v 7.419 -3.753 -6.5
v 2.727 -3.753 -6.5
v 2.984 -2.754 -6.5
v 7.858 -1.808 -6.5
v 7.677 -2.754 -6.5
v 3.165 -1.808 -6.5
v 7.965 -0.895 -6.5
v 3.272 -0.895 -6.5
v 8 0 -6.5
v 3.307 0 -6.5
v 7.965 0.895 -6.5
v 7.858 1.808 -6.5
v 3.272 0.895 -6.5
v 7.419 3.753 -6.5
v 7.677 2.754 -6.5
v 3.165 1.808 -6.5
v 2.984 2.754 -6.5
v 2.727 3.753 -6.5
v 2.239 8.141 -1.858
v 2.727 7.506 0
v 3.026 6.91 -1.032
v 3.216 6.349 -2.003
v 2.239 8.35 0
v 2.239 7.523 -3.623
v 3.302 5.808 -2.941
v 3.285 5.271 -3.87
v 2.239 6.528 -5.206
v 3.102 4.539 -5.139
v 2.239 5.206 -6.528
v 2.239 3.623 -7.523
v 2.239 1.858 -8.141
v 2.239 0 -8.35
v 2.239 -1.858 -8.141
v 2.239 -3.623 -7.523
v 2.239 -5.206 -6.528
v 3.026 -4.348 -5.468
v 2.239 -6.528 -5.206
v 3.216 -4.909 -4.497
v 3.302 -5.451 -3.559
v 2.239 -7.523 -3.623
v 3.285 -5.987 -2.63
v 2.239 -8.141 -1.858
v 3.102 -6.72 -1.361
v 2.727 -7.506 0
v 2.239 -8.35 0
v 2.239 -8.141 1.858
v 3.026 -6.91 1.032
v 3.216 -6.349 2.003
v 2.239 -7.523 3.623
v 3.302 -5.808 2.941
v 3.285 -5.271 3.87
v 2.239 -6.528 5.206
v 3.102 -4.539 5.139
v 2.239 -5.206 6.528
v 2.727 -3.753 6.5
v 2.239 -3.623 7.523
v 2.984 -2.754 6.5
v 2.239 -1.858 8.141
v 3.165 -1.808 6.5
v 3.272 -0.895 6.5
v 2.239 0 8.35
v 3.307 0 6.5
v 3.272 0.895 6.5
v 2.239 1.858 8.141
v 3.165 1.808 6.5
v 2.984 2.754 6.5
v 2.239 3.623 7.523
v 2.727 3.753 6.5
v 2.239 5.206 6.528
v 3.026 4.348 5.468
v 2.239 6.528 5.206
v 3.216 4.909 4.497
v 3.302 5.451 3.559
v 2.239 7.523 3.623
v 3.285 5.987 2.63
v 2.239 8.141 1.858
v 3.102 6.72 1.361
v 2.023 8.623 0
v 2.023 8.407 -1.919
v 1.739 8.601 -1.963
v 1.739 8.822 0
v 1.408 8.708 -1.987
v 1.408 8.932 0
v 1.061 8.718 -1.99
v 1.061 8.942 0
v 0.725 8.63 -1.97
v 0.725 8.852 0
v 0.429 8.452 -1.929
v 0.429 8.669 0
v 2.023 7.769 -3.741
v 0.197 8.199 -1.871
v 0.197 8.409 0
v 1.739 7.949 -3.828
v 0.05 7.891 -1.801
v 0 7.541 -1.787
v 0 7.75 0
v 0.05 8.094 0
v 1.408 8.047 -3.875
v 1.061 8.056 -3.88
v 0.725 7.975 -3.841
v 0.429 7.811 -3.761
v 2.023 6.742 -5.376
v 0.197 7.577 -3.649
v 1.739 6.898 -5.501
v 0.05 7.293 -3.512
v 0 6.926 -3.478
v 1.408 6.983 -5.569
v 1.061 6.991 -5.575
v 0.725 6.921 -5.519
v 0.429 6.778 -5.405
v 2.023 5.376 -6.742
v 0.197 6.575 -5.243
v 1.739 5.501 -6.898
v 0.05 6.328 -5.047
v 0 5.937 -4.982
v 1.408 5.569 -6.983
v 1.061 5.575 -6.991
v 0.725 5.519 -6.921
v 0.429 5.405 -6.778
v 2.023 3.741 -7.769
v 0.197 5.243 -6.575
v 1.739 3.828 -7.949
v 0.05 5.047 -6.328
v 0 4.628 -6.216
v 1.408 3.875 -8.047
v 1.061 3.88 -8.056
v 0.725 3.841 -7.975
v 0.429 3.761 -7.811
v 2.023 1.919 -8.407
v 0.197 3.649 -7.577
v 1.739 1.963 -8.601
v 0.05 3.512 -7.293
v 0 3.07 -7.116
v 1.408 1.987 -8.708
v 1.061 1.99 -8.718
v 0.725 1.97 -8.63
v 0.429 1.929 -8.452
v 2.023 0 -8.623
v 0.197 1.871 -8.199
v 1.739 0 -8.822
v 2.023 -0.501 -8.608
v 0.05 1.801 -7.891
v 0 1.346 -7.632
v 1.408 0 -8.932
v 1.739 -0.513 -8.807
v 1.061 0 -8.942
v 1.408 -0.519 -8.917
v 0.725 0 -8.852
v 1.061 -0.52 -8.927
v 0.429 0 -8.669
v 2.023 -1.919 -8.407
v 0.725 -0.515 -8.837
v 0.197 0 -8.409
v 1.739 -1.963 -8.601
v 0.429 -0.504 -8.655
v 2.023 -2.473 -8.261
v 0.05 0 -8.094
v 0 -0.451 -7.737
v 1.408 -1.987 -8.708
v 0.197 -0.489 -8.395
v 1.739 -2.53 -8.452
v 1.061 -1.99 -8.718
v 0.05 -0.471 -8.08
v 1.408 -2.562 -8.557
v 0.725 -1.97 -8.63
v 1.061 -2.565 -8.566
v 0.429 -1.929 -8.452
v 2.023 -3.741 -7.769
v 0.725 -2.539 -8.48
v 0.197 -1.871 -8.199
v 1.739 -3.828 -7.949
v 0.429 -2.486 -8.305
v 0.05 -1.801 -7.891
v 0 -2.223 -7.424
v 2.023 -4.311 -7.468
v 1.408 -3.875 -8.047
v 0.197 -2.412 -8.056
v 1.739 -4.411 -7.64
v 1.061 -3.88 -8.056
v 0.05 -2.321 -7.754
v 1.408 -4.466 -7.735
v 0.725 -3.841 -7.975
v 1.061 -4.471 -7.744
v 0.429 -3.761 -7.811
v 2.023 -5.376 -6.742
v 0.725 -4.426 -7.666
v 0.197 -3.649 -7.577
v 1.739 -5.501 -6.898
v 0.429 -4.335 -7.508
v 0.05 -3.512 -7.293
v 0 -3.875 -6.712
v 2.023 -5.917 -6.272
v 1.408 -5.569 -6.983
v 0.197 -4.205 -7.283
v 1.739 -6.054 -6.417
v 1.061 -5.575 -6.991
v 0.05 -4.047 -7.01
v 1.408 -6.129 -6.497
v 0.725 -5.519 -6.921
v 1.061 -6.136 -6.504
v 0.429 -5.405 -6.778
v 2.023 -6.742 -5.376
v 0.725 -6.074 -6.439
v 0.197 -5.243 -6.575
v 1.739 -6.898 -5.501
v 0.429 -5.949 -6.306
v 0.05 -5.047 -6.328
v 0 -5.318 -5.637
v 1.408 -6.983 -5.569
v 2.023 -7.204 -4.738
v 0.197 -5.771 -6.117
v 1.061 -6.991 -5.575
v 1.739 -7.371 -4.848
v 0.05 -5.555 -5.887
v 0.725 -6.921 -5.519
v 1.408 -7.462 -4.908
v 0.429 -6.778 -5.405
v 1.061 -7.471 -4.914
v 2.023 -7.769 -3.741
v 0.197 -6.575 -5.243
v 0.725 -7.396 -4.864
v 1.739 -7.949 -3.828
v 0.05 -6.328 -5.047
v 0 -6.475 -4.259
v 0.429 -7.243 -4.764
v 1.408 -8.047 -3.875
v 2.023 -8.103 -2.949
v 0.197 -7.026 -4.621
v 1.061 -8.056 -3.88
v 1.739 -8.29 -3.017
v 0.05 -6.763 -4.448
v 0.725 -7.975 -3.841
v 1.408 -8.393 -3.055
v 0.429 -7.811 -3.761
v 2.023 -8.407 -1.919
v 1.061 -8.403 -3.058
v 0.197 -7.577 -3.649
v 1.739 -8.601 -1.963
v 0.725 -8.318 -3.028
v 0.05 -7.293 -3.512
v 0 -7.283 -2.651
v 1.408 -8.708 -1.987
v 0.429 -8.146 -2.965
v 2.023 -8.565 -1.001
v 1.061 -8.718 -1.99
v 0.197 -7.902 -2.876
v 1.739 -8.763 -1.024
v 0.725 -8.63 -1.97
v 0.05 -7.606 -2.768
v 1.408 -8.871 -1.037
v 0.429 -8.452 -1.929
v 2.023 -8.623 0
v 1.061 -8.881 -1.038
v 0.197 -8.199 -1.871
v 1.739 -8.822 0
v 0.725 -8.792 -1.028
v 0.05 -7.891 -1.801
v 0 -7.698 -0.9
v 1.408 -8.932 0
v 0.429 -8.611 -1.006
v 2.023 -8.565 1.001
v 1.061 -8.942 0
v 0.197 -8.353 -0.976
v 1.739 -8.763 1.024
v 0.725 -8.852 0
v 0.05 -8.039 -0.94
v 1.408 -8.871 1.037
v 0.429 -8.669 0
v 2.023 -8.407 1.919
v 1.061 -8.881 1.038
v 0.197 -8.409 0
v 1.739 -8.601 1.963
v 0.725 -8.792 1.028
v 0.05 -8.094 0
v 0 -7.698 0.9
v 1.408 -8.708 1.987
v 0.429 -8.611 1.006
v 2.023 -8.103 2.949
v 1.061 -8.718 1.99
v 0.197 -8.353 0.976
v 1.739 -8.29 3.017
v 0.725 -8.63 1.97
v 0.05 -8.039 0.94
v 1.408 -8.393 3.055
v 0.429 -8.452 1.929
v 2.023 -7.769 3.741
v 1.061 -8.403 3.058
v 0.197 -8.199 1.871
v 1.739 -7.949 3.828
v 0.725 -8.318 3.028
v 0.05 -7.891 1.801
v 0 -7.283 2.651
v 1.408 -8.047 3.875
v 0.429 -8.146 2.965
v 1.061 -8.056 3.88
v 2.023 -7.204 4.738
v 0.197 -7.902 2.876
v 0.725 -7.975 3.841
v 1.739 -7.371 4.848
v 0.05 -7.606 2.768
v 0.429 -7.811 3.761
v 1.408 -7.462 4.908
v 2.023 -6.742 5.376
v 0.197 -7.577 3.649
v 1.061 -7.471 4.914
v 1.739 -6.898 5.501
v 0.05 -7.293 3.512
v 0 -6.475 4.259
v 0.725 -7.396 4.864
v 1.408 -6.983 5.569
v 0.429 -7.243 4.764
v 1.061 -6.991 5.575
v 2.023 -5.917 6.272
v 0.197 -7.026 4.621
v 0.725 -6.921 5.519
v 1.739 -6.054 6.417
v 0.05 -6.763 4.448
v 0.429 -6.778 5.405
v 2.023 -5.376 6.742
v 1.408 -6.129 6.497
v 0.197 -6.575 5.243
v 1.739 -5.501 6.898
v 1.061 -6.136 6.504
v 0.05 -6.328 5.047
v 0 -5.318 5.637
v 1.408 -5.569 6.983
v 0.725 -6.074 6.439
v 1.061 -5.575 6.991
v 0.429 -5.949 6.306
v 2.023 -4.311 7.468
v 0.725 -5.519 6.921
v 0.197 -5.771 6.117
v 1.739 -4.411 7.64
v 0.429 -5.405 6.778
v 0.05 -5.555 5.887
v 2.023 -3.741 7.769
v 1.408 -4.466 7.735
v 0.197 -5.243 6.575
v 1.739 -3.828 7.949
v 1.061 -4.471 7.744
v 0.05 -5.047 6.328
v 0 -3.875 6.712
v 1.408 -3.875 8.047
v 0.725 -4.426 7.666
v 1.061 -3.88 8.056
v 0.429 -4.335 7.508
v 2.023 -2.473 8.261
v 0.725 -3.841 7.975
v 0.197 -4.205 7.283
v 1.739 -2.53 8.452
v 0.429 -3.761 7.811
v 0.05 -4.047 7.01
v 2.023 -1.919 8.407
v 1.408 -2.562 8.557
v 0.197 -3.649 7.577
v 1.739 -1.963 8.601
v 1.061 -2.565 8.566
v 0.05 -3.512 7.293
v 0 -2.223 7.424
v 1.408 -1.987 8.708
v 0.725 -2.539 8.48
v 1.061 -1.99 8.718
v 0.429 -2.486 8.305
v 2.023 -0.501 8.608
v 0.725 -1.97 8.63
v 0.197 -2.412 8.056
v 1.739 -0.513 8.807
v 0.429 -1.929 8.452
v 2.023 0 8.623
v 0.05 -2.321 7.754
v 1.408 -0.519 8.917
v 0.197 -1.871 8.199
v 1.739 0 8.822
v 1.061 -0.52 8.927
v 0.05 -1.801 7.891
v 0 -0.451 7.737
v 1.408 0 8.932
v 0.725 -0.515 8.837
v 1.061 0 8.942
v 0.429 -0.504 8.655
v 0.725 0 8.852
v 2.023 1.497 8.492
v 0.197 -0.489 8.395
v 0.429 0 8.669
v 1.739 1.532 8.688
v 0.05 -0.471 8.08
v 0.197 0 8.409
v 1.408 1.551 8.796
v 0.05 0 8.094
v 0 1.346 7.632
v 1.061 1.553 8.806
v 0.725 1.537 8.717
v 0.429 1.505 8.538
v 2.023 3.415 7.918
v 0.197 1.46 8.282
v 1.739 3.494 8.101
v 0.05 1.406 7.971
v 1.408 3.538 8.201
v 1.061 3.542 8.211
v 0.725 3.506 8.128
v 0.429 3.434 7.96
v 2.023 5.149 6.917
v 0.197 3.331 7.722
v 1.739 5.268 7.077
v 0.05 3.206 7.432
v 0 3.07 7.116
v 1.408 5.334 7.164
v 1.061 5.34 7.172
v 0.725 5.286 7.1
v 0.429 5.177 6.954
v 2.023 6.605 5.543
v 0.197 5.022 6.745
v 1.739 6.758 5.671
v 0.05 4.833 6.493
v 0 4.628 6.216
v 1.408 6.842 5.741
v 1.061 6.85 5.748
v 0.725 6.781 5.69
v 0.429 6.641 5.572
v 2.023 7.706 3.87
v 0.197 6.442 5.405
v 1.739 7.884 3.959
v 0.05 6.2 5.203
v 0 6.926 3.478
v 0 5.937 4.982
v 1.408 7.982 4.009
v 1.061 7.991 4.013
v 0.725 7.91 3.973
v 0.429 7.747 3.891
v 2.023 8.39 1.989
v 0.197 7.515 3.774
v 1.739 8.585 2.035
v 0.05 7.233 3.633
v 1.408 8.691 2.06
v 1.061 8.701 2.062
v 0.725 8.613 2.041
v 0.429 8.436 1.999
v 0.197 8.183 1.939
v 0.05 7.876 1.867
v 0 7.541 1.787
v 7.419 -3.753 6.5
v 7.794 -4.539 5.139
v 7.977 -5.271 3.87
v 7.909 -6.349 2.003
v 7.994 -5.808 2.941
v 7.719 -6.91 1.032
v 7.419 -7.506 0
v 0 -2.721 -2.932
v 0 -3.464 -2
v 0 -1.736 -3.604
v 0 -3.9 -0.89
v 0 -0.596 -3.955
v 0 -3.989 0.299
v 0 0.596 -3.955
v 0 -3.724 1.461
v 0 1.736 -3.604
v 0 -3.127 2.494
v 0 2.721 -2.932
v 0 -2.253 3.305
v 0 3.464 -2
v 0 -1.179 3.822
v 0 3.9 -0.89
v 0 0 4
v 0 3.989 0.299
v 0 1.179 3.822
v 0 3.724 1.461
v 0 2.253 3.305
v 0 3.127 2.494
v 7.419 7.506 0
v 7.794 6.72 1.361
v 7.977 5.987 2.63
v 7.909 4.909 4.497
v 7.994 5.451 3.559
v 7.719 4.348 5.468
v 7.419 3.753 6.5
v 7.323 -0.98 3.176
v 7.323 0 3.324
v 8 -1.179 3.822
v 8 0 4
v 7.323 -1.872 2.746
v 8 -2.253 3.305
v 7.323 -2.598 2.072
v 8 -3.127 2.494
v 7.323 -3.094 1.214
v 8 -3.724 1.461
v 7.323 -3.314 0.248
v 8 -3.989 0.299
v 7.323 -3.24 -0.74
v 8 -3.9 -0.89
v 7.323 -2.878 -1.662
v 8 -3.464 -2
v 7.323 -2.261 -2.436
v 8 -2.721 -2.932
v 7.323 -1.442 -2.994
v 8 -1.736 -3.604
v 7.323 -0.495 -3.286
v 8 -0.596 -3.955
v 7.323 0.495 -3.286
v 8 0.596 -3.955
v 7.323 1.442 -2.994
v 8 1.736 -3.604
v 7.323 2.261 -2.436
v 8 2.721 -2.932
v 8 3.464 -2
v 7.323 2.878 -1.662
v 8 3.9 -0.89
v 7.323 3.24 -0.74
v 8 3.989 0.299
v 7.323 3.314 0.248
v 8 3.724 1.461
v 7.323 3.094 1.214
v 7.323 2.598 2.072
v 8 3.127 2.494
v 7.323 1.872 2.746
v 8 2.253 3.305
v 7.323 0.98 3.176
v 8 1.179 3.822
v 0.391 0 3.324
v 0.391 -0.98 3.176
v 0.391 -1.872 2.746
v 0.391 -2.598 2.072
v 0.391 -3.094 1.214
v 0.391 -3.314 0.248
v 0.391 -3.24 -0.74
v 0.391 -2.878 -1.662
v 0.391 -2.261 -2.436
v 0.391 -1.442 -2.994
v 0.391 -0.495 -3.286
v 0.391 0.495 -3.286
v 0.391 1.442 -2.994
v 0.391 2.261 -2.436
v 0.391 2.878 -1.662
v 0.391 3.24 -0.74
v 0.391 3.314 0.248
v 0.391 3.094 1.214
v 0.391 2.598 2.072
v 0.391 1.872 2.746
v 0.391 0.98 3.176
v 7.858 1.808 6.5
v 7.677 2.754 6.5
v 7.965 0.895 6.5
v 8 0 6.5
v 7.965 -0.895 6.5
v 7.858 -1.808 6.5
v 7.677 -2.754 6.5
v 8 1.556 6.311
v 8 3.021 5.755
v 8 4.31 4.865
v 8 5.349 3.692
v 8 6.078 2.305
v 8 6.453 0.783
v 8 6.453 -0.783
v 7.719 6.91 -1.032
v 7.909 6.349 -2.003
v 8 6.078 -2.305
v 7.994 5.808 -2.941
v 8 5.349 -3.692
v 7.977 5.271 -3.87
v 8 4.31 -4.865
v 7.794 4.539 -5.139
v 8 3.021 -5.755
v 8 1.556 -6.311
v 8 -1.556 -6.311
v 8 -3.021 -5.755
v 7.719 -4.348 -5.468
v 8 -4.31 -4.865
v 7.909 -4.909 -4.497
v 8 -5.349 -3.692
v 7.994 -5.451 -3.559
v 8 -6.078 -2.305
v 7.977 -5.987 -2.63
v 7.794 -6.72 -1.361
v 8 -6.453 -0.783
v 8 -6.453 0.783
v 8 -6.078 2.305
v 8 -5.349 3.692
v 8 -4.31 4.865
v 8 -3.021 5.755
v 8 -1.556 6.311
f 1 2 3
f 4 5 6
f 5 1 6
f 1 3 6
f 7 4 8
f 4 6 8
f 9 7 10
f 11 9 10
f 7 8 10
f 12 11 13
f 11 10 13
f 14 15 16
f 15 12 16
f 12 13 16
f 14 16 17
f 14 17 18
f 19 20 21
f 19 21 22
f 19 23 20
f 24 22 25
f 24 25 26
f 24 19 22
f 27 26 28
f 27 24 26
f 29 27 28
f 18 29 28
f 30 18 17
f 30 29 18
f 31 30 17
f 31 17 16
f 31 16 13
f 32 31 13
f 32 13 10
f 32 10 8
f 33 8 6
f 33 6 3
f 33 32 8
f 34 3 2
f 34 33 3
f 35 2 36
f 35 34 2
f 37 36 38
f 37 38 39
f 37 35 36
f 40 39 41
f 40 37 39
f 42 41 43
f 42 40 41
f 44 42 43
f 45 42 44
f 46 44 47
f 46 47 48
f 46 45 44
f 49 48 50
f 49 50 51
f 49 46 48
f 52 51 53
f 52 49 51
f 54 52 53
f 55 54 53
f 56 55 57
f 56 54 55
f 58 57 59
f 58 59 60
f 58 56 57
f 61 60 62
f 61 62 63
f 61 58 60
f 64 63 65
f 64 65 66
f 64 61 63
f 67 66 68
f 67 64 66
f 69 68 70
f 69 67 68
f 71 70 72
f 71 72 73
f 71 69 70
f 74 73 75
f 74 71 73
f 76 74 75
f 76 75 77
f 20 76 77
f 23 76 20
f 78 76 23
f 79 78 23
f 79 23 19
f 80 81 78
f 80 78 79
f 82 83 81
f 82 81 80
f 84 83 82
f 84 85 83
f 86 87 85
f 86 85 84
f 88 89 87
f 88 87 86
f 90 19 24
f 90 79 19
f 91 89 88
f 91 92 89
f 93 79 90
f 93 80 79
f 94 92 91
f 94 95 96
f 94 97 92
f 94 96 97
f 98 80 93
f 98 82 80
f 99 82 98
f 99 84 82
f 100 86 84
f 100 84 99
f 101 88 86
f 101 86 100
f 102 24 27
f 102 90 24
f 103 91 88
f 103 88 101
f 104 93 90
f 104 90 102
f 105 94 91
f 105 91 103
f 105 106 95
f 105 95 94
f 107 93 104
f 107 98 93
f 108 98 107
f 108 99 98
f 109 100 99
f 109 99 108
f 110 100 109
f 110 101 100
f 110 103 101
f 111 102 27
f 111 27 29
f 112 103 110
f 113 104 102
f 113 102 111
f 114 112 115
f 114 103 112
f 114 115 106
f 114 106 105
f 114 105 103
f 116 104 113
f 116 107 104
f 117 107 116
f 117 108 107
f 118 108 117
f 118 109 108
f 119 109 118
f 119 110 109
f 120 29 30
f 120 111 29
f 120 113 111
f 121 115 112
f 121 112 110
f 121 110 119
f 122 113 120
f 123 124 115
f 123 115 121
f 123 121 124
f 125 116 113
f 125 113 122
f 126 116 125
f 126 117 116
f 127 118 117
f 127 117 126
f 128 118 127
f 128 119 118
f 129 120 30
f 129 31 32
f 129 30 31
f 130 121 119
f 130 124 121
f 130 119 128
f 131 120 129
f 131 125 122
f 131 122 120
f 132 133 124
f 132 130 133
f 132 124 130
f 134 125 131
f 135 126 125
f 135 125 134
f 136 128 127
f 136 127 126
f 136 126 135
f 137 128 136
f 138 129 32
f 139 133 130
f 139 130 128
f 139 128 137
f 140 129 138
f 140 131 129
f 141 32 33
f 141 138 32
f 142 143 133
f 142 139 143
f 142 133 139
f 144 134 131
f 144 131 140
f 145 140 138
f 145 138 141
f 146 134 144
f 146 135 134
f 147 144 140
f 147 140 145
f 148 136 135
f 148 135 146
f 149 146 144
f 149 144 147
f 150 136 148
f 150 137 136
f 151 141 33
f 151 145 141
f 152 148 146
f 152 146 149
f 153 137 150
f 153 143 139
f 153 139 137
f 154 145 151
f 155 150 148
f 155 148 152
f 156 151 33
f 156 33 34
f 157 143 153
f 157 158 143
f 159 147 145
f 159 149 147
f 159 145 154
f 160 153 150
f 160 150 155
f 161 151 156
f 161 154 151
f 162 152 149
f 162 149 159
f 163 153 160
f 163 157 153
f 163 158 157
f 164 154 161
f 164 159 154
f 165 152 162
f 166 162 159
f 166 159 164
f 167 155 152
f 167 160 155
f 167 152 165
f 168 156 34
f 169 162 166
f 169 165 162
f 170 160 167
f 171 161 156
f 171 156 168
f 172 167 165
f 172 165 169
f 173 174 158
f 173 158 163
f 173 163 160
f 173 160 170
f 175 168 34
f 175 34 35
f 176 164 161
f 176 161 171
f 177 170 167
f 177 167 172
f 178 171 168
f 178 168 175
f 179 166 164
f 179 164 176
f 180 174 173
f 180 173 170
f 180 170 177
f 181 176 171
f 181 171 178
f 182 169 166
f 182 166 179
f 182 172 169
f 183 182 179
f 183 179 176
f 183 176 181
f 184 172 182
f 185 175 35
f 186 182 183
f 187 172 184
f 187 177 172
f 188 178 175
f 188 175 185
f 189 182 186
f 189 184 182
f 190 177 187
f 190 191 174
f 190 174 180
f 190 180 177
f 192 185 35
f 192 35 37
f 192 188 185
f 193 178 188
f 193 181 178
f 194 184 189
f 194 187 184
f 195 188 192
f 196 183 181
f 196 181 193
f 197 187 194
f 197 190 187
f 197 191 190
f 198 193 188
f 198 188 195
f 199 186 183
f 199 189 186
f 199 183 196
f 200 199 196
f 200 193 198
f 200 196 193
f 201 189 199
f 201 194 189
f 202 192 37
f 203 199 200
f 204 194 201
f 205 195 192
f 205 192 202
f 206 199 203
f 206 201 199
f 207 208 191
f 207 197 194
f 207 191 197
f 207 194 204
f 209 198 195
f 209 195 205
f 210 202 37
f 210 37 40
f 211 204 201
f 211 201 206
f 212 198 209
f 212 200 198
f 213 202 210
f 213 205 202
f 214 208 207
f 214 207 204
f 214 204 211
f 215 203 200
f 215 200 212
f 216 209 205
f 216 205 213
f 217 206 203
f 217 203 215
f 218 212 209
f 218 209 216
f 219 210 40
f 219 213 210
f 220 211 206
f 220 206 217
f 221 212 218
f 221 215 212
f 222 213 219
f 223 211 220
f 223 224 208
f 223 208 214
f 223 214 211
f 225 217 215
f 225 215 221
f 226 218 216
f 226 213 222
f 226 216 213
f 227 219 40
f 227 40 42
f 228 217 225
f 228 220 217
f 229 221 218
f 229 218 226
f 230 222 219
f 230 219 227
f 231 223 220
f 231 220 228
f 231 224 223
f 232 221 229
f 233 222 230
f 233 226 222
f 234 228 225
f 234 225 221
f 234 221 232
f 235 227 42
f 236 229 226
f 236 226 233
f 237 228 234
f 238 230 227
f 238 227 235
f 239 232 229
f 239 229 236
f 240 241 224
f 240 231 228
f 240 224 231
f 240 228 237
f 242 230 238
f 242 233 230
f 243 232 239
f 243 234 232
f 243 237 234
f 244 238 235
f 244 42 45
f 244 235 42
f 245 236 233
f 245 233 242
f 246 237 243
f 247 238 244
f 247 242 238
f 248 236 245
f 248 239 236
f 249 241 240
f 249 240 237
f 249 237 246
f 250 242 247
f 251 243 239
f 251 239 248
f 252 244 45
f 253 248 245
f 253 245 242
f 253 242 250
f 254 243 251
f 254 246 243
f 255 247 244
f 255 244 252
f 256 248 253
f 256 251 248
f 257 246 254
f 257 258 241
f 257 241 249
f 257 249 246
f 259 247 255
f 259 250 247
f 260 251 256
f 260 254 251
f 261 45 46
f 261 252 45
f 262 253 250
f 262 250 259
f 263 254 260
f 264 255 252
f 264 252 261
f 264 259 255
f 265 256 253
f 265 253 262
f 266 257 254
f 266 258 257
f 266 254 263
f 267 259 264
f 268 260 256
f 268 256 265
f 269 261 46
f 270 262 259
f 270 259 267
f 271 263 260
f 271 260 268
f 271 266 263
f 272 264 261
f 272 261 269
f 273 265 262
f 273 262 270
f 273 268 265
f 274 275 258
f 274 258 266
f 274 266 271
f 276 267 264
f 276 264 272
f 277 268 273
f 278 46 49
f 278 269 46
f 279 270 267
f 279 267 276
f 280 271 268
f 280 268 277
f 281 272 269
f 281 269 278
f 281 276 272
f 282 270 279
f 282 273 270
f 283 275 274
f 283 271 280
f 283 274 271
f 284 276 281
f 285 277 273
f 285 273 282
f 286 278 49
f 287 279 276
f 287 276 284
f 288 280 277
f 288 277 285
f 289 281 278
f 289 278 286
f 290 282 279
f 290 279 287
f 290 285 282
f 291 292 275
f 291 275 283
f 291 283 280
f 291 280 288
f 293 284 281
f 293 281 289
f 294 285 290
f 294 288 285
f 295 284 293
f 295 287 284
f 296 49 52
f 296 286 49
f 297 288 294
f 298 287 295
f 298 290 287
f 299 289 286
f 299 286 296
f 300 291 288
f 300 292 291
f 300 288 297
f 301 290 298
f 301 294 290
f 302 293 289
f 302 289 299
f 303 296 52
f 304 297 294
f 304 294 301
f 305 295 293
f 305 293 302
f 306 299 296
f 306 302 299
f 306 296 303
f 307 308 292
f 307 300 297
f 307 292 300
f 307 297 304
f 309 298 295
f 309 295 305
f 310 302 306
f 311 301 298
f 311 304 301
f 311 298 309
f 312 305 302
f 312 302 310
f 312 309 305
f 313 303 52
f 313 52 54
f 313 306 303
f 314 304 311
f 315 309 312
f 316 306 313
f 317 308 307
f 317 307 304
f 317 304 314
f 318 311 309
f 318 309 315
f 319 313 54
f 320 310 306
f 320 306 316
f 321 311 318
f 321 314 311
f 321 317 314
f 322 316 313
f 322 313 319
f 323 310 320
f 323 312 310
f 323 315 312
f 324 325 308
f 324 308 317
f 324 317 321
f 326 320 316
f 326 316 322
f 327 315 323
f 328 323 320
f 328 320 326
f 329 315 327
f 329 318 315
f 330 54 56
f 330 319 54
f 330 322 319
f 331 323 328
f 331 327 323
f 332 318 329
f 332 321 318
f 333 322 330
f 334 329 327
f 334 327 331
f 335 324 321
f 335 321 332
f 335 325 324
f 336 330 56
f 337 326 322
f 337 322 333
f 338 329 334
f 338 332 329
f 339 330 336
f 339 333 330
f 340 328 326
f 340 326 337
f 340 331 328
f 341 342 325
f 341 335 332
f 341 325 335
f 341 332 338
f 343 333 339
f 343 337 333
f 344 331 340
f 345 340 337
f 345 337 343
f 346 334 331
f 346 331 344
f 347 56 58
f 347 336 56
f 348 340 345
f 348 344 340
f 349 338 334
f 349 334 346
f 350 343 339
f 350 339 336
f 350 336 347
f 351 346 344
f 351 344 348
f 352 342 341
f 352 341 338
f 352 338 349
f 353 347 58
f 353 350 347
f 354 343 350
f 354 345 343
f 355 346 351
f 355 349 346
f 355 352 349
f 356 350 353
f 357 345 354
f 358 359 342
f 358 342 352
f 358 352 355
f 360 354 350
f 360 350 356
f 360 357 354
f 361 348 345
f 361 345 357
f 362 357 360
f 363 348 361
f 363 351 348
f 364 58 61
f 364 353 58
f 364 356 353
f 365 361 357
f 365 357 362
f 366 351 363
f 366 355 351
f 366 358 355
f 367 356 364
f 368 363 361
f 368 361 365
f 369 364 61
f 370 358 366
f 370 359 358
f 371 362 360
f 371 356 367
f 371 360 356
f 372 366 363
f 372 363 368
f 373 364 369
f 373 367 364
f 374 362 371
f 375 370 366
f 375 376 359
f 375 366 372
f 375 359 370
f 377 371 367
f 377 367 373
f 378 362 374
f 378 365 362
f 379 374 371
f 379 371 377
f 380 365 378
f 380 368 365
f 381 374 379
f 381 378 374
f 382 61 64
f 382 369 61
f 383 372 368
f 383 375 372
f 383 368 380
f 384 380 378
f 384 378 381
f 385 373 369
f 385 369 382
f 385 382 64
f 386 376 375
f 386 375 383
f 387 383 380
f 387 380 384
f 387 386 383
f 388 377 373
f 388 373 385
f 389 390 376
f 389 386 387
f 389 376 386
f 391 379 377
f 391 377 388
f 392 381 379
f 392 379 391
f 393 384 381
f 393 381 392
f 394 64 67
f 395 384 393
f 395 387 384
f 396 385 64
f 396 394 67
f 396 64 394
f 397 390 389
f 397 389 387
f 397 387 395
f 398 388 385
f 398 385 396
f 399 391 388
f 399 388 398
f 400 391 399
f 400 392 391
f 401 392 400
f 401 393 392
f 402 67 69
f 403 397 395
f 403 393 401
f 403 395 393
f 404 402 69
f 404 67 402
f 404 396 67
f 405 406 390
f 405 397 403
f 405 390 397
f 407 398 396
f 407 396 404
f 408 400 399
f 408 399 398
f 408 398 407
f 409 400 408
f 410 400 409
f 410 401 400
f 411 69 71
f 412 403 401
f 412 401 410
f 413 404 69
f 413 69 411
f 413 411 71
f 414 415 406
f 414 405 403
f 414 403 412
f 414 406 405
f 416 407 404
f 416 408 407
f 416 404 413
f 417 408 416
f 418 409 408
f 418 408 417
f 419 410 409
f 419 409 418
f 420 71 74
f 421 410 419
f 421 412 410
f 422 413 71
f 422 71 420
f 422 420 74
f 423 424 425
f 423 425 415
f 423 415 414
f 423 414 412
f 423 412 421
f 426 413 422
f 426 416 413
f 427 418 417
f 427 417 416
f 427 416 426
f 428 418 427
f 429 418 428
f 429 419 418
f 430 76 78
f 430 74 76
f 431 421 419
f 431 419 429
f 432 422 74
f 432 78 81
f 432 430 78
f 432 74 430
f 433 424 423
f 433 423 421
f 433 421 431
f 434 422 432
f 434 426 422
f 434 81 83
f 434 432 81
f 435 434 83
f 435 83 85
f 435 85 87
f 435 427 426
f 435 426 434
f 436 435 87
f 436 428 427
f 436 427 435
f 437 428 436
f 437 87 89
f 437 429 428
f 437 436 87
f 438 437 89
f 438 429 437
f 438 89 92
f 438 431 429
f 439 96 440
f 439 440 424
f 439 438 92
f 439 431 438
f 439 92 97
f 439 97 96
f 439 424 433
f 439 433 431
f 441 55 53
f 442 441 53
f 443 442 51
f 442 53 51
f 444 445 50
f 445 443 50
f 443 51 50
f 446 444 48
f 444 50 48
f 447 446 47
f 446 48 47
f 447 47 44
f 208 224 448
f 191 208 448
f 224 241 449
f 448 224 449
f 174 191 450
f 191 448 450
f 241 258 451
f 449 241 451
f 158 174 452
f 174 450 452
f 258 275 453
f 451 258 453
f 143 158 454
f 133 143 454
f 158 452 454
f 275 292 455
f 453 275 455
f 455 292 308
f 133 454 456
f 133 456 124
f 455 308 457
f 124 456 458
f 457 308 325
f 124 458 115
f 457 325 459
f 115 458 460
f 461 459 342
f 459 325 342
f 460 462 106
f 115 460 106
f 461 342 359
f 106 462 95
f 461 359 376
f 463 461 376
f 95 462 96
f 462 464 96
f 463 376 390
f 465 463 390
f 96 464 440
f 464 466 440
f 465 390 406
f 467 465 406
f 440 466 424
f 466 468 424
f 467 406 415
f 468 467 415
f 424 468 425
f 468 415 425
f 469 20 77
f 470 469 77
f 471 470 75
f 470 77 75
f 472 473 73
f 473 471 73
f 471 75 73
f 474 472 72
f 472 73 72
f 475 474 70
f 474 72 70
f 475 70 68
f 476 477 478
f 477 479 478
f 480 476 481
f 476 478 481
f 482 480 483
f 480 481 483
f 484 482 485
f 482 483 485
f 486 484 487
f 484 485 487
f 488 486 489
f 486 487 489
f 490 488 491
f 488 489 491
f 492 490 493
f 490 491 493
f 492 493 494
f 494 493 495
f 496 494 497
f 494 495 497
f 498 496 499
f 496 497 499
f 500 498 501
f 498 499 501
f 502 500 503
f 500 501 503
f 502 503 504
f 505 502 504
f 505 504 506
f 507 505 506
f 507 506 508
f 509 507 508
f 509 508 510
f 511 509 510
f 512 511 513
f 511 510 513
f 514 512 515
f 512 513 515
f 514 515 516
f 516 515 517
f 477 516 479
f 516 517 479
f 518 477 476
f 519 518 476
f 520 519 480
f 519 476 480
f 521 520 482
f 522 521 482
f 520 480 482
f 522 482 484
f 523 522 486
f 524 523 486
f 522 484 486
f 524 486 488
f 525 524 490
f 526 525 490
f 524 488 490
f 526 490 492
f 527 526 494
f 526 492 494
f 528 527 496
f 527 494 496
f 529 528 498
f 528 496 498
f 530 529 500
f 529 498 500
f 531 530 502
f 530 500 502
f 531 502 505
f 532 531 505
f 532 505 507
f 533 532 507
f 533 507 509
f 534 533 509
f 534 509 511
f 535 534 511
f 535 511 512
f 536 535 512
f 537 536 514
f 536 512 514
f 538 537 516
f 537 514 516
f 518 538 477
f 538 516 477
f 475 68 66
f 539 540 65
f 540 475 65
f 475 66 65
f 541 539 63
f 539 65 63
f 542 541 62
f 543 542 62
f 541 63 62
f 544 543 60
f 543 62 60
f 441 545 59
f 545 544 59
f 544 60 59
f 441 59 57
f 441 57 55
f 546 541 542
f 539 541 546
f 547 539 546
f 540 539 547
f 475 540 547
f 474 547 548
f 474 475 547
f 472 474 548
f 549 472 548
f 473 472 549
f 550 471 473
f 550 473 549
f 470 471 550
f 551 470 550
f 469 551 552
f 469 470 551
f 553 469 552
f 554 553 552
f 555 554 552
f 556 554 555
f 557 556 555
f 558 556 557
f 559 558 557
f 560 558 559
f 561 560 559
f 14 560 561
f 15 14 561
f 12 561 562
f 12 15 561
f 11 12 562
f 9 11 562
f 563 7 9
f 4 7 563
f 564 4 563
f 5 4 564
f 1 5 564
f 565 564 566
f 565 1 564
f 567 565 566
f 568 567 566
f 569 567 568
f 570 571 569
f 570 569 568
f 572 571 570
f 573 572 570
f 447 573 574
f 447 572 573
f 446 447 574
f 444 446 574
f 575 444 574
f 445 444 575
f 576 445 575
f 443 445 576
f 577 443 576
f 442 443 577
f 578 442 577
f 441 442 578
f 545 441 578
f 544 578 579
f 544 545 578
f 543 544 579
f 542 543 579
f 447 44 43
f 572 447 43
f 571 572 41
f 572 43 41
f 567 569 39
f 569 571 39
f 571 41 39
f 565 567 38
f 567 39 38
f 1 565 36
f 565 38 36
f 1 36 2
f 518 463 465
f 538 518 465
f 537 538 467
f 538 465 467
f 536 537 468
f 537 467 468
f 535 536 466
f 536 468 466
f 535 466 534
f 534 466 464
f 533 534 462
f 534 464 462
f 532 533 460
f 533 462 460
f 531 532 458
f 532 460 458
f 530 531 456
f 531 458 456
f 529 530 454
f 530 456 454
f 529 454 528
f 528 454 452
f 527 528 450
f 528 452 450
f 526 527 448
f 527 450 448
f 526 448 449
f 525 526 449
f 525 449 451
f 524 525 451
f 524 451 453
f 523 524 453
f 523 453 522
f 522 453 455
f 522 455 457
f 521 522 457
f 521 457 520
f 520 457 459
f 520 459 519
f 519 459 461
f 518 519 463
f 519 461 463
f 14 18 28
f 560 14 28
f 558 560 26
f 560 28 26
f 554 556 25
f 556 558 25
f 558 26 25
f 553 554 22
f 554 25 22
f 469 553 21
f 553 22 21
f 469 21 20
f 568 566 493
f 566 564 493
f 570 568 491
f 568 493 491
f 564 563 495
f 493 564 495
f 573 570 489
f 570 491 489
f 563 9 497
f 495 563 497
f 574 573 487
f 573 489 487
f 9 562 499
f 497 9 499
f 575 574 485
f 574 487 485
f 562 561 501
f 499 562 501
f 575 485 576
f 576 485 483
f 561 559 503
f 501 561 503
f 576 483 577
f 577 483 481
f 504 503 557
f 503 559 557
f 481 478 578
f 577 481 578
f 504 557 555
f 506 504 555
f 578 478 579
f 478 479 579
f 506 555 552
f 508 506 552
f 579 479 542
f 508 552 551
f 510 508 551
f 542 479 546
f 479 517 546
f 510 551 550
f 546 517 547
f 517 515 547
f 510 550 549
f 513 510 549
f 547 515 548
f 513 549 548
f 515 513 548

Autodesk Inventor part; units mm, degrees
ref_plane "YZ Plane" through (0, 0, 0) normal (1, 0, 0) x (0, 1, 0)
ref_plane "XZ Plane" through (0, 0, 0) normal (0, 1, 0) x (-1, 0, 0)
sketch "Sketch1" plane through (0, 0, 0) normal (0, 0, 1) x (1, 0, 0)
  line L0 (-1.8762, 0) -> (9.646, 0) projected
  line L1 (3.3073, 6.5) -> (2.2392, 8.35)
  line L2 (3.3073, 6.5) -> (8, 6.5) construction
  line L3 (8, 6.5) -> (8, 0) construction
  arc A0 (2.2392, 8.35) -> (0, 7.75) centre (1.2, 7.75) ccw
  line L4 (3.3073, 6.5) -> (3.3073, 0)
  line L5 (0, -1.8418) -> (0, 11.0509) projected
  point P0 (0, 0)
  dimension "d2" = 13
  dimension "d4" = 17.9
  dimension "d5" = 1.2
  dimension "d15" = 8
  dimension "d16" = 30
revolve "Ring" add sketch "Sketch1" angle 360 about axis through (-10, 0, 0) along (1, 0, 0)
sketch "Sketch2" plane through (0, 0, 0) normal (-1, 0, 0) x (0, 0, 1)
  circle A0 centre (0, 0) radius 4.9
  line L0 (-6.5, -3.7528) -> (-6.5, 3.7528)
  line L1 (-6.5, 3.7528) -> (0, 7.5056)
  line L2 (0, 7.5056) -> (6.5, 3.7528)
  line L3 (6.5, 3.7528) -> (6.5, -3.7528)
  line L4 (6.5, -3.7528) -> (0, -7.5056)
  line L5 (0, -7.5056) -> (-6.5, -3.7528)
  circle A1 centre (0, 0) radius 7.75 projected
  dimension "d6" = 15.0111
extrude "Body" add sketch "Sketch2" against normal blind 8 contours A0 | L0 L1 L2 L3 L4 L5
sketch "Sketch3" plane through (0, 0, 0) normal (0, 0, 1) x (1, 0, 0)
  line L0 (2.7268, 7.5056) -> (8, 7.5056) projected
  line L1 (8, 3.7528) -> (8, 7.5056) projected
  line L2 (0, -7.75) -> (0, 7.75) projected
  line L3 (-1.6, 0) -> (9.6, 0) projected
  line L4 (7.4194, 7.5056) -> (8, 6.5)
  dimension "d10" = 30
  dimension "d11" = 13
revolve "Chamfer1" cut sketch "Sketch3" angle 360 about axis through (-10, 0, 0) along (1, 0, 0)
sketch "Sketch4" plane through (0, 0, 0) normal (-1, 0, 0) x (0, 0, 1)
  circle A0 centre (0, 0) radius 7.75 projected
hole "Thread" at (0, 0, 0) direction (1, 0, 0) diameter 6.647 end through all thread size "M8x1.25" class "6H" standard "ANSI Metric M Profile"
chamfer "Chamfer2" distance 0.6766 angle 30 1 edges at (0, 0, -3.3235) measured on face at (0, 6.1914, -0.7518)
ref_plane "Work Plane1" through (26.5484, 0, 0) normal (0, 0, -1) x (-1, 0, 0)
chamfer "Chamfer3" distance 0.6766 angle 45 1 edges at (8, 0, -3.3235)
equation "\"d2\" = SW"
equation "\"d4\" = LADI"
equation "\"d5\" = PHH"
equation "\"d15\" = KOH"
equation "\"d16\" = KEWI"
equation "\"d6\" = 1.1547 * SW"
equation "\"d7\" = KOH"
equation "\"d10\" = ANG1"
equation "\"d11\" = SW0"
equation "\"d12\" = -0.5 * GD1 + 0.5 * NND"
equation "\"d46\" = -0.5 * GD1 + 0.5 * NND"
equation "\"d51\" = -0.5 * GD1 + 0.5 * NND"
equation "\"ANG1\" = 30deg"
equation "\"KEWI\" = 30deg"
equation "\"NND\" = 8"
equation "\"LADI\" = 17.9"
equation "\"SW\" = 13"
equation "\"PHH\" = RR"
equation "\"KOH\" = 8"
equation "\"SW0\" = SW"
equation "\"d1\" = LADI"
equation "\"d3\" = PHH"
equation "\"GUL\" = 0.541266 * PTC"
equation "\"RR\" = 1.2"
equation "\"THREADDIA\" = 8"
equation "\"TOA\" = 30deg"
equation "\"PTC\" = 1.25"
equation "\"RR1\" = 0.5"
equation "\"GAL\" = 0.541266 * PTC"
equation "\"E0\" = 1.155 * SW"
equation "\"GD1\" = 6.646835"
properties part number "ANSI B18.2.4.4M - M8 x 1,25" material "Steel, Mild"
